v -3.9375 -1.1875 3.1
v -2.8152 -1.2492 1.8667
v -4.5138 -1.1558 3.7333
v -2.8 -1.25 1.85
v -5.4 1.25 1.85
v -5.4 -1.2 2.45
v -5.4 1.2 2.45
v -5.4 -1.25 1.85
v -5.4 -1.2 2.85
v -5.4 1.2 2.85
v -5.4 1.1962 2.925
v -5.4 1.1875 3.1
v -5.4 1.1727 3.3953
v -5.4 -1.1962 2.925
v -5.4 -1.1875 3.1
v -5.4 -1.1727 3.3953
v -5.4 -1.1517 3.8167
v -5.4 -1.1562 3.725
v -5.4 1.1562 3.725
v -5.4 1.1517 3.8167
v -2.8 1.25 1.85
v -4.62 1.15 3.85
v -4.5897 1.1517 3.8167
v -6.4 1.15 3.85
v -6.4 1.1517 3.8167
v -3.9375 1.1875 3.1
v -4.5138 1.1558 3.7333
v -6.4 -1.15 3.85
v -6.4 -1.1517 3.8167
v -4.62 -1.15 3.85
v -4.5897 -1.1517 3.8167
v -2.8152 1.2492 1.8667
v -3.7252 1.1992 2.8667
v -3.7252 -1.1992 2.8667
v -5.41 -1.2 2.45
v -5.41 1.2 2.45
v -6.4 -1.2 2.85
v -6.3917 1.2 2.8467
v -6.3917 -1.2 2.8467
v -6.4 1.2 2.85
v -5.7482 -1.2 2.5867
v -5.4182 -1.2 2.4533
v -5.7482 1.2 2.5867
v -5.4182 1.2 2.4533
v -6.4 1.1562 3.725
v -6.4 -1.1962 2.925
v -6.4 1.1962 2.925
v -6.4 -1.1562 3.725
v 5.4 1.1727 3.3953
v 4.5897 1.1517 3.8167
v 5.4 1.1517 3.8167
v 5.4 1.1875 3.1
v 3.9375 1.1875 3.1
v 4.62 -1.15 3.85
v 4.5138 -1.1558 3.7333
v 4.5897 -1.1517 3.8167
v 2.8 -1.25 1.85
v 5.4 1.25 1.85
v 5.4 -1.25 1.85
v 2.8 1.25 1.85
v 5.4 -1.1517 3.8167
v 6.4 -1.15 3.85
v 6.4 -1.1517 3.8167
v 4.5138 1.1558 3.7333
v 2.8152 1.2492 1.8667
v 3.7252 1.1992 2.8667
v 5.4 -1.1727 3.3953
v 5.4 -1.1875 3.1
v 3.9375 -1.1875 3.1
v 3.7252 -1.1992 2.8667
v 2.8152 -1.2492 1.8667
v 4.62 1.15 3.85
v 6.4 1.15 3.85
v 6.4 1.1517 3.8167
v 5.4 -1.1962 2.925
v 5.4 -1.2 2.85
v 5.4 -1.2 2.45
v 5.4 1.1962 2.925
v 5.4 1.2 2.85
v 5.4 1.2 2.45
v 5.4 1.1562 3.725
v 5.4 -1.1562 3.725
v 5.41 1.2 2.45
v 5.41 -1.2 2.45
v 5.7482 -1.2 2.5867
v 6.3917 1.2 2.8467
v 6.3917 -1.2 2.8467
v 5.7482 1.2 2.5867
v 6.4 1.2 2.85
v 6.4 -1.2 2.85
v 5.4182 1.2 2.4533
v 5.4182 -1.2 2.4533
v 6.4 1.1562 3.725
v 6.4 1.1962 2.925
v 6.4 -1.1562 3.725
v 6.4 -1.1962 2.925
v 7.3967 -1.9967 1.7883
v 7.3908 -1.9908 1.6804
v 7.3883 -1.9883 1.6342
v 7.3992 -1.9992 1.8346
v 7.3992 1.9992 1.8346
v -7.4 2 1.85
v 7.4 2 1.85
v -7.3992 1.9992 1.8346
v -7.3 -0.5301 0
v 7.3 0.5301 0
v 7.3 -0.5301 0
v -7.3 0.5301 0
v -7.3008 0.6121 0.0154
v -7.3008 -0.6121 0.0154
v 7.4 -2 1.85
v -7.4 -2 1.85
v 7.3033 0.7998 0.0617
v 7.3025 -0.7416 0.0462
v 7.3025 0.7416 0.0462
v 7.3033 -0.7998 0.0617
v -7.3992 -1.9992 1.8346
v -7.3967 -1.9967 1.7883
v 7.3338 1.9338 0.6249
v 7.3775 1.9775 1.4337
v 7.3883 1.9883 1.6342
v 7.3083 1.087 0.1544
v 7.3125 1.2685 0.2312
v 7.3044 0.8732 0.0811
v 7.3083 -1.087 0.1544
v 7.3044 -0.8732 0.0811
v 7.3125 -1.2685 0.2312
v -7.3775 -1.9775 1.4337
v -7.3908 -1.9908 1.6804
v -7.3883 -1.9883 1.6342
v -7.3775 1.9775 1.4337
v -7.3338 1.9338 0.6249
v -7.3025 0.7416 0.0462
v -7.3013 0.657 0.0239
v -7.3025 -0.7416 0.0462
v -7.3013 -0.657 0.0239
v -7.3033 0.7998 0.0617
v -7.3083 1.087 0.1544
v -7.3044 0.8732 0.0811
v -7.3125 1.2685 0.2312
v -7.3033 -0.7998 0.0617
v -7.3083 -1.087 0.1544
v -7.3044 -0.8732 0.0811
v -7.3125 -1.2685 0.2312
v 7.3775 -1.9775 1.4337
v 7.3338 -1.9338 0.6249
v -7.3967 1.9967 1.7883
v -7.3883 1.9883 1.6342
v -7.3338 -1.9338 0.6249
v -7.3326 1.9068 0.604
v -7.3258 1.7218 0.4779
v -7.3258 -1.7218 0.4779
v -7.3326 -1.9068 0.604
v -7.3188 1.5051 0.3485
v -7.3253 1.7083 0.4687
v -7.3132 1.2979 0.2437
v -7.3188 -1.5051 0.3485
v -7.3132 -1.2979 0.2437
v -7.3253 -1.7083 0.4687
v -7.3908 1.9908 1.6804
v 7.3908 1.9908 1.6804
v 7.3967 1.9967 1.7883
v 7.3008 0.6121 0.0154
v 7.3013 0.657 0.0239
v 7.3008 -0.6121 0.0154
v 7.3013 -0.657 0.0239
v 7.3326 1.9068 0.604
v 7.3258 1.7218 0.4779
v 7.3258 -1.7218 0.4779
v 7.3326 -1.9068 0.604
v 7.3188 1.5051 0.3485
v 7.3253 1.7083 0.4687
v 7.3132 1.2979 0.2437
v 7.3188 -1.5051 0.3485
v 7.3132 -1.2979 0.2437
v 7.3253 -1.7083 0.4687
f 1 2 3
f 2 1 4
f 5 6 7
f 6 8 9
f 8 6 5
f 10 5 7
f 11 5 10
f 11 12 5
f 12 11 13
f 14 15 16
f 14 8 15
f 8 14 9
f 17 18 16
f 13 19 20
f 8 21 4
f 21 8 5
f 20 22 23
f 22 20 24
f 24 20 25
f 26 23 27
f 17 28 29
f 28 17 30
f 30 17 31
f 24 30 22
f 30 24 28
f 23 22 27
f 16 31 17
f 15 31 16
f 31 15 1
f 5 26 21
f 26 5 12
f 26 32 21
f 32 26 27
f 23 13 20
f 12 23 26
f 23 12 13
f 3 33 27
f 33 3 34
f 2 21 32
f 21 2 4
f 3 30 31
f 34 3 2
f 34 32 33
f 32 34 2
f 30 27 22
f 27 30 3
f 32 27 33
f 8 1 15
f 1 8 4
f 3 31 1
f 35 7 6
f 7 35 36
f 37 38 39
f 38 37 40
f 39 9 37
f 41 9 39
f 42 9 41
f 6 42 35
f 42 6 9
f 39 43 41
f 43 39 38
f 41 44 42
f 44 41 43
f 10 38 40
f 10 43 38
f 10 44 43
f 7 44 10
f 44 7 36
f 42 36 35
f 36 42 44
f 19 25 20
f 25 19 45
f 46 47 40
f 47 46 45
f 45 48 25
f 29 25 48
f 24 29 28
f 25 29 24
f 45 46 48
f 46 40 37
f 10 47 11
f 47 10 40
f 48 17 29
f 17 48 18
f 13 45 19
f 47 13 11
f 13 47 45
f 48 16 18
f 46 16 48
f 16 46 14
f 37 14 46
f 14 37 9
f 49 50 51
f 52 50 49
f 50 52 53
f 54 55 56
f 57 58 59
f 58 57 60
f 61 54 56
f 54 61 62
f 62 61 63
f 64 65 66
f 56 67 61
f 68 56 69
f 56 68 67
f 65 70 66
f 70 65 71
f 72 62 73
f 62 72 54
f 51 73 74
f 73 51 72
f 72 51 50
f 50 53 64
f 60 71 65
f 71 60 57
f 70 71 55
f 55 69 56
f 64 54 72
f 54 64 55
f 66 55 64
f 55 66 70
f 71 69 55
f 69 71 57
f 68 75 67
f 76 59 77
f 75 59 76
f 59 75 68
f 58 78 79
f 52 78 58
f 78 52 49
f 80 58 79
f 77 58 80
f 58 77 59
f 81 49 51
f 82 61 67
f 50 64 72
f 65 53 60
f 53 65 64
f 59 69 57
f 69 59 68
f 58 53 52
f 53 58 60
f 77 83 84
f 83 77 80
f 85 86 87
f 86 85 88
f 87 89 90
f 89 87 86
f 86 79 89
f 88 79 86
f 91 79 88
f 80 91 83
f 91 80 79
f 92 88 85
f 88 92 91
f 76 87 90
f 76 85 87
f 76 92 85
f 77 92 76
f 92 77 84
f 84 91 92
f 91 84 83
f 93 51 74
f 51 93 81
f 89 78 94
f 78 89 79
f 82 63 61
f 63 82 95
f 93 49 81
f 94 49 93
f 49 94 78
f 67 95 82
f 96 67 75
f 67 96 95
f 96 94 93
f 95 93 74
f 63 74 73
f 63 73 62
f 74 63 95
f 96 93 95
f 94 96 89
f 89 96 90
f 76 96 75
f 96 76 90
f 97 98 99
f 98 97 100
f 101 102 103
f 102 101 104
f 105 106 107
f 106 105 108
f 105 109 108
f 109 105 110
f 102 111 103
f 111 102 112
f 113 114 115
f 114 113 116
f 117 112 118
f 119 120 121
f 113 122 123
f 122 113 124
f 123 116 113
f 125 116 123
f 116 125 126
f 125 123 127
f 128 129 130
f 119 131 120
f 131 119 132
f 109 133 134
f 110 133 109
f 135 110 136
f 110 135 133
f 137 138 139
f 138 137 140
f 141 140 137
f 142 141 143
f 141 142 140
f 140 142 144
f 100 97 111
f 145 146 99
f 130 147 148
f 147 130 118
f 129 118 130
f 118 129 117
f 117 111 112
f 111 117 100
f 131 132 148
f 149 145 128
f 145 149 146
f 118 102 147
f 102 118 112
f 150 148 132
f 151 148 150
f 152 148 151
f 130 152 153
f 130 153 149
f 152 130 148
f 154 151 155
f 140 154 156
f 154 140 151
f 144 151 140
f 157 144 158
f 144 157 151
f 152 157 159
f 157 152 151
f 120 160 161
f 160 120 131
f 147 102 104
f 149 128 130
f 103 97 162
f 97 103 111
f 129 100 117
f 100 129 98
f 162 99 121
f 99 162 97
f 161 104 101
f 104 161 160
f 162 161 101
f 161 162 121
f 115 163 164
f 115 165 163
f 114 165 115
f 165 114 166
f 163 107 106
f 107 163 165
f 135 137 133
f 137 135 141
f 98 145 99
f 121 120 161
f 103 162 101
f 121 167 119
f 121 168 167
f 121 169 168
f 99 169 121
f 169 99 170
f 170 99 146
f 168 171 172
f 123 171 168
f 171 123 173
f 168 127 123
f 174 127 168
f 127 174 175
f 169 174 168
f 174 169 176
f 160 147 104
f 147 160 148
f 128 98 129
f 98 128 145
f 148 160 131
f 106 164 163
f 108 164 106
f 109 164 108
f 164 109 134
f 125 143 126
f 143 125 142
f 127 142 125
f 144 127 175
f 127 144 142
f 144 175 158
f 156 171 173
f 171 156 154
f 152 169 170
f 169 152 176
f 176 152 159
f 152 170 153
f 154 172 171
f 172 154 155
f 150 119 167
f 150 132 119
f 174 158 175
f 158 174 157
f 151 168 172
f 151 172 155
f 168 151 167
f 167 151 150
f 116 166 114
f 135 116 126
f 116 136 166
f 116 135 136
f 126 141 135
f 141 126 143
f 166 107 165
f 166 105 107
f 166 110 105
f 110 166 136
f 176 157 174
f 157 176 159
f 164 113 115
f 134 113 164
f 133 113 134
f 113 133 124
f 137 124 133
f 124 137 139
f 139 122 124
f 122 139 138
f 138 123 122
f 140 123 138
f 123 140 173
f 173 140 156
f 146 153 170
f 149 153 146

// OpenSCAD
// Macintosh HDI-20 External 1.44MB Floppy Drive rubber feet
// Copyright 2026, François Revol

bbox = [14.8, 4, 3.85];

base_height = 1.85;

$fn = $preview ? 60 : 120;

main_r = 6;

optimize_fdm = true;

intersection() {
    union() {
        linear_extrude(base_height, scale=[bbox.x/(bbox.x-0.2),bbox.y/(bbox.y-0.2)]) square([bbox.x-0.2,bbox.y-0.2], center=true);
        for (dx=[-1,1]) {
            translate([dx*(bbox.x/2-2),0,base_height]) {
                clip_slope = optimize_fdm ? 0.4 : 0.2;
                linear_extrude(2, scale=[0.3,2.3/2.5]) translate([-dx*2.6/2,0,0]) square([2.6,2.5], center=true);
                translate([0,0,1-clip_slope]) linear_extrude(clip_slope, scale=[100,1]) translate([dx*.01/2,0,0]) square([0.01,2.4], center=true);
                translate([0,0,1]) linear_extrude(1, scale=[1,2.3/2.4]) translate([dx*1/2,0,0]) square([1,2.4], center=true);
            }
        }
    }
    translate([0,0,main_r-(optimize_fdm?0.05:0)]) scale([1,optimize_fdm?0.7:1,1]) rotate([0,90,0]) cylinder(r=main_r, h=bbox.x*2, center=true);
}

//if ($preview) color("green", 0.2) translate([0,0,bbox.z/2]) cube(bbox, center=true);
